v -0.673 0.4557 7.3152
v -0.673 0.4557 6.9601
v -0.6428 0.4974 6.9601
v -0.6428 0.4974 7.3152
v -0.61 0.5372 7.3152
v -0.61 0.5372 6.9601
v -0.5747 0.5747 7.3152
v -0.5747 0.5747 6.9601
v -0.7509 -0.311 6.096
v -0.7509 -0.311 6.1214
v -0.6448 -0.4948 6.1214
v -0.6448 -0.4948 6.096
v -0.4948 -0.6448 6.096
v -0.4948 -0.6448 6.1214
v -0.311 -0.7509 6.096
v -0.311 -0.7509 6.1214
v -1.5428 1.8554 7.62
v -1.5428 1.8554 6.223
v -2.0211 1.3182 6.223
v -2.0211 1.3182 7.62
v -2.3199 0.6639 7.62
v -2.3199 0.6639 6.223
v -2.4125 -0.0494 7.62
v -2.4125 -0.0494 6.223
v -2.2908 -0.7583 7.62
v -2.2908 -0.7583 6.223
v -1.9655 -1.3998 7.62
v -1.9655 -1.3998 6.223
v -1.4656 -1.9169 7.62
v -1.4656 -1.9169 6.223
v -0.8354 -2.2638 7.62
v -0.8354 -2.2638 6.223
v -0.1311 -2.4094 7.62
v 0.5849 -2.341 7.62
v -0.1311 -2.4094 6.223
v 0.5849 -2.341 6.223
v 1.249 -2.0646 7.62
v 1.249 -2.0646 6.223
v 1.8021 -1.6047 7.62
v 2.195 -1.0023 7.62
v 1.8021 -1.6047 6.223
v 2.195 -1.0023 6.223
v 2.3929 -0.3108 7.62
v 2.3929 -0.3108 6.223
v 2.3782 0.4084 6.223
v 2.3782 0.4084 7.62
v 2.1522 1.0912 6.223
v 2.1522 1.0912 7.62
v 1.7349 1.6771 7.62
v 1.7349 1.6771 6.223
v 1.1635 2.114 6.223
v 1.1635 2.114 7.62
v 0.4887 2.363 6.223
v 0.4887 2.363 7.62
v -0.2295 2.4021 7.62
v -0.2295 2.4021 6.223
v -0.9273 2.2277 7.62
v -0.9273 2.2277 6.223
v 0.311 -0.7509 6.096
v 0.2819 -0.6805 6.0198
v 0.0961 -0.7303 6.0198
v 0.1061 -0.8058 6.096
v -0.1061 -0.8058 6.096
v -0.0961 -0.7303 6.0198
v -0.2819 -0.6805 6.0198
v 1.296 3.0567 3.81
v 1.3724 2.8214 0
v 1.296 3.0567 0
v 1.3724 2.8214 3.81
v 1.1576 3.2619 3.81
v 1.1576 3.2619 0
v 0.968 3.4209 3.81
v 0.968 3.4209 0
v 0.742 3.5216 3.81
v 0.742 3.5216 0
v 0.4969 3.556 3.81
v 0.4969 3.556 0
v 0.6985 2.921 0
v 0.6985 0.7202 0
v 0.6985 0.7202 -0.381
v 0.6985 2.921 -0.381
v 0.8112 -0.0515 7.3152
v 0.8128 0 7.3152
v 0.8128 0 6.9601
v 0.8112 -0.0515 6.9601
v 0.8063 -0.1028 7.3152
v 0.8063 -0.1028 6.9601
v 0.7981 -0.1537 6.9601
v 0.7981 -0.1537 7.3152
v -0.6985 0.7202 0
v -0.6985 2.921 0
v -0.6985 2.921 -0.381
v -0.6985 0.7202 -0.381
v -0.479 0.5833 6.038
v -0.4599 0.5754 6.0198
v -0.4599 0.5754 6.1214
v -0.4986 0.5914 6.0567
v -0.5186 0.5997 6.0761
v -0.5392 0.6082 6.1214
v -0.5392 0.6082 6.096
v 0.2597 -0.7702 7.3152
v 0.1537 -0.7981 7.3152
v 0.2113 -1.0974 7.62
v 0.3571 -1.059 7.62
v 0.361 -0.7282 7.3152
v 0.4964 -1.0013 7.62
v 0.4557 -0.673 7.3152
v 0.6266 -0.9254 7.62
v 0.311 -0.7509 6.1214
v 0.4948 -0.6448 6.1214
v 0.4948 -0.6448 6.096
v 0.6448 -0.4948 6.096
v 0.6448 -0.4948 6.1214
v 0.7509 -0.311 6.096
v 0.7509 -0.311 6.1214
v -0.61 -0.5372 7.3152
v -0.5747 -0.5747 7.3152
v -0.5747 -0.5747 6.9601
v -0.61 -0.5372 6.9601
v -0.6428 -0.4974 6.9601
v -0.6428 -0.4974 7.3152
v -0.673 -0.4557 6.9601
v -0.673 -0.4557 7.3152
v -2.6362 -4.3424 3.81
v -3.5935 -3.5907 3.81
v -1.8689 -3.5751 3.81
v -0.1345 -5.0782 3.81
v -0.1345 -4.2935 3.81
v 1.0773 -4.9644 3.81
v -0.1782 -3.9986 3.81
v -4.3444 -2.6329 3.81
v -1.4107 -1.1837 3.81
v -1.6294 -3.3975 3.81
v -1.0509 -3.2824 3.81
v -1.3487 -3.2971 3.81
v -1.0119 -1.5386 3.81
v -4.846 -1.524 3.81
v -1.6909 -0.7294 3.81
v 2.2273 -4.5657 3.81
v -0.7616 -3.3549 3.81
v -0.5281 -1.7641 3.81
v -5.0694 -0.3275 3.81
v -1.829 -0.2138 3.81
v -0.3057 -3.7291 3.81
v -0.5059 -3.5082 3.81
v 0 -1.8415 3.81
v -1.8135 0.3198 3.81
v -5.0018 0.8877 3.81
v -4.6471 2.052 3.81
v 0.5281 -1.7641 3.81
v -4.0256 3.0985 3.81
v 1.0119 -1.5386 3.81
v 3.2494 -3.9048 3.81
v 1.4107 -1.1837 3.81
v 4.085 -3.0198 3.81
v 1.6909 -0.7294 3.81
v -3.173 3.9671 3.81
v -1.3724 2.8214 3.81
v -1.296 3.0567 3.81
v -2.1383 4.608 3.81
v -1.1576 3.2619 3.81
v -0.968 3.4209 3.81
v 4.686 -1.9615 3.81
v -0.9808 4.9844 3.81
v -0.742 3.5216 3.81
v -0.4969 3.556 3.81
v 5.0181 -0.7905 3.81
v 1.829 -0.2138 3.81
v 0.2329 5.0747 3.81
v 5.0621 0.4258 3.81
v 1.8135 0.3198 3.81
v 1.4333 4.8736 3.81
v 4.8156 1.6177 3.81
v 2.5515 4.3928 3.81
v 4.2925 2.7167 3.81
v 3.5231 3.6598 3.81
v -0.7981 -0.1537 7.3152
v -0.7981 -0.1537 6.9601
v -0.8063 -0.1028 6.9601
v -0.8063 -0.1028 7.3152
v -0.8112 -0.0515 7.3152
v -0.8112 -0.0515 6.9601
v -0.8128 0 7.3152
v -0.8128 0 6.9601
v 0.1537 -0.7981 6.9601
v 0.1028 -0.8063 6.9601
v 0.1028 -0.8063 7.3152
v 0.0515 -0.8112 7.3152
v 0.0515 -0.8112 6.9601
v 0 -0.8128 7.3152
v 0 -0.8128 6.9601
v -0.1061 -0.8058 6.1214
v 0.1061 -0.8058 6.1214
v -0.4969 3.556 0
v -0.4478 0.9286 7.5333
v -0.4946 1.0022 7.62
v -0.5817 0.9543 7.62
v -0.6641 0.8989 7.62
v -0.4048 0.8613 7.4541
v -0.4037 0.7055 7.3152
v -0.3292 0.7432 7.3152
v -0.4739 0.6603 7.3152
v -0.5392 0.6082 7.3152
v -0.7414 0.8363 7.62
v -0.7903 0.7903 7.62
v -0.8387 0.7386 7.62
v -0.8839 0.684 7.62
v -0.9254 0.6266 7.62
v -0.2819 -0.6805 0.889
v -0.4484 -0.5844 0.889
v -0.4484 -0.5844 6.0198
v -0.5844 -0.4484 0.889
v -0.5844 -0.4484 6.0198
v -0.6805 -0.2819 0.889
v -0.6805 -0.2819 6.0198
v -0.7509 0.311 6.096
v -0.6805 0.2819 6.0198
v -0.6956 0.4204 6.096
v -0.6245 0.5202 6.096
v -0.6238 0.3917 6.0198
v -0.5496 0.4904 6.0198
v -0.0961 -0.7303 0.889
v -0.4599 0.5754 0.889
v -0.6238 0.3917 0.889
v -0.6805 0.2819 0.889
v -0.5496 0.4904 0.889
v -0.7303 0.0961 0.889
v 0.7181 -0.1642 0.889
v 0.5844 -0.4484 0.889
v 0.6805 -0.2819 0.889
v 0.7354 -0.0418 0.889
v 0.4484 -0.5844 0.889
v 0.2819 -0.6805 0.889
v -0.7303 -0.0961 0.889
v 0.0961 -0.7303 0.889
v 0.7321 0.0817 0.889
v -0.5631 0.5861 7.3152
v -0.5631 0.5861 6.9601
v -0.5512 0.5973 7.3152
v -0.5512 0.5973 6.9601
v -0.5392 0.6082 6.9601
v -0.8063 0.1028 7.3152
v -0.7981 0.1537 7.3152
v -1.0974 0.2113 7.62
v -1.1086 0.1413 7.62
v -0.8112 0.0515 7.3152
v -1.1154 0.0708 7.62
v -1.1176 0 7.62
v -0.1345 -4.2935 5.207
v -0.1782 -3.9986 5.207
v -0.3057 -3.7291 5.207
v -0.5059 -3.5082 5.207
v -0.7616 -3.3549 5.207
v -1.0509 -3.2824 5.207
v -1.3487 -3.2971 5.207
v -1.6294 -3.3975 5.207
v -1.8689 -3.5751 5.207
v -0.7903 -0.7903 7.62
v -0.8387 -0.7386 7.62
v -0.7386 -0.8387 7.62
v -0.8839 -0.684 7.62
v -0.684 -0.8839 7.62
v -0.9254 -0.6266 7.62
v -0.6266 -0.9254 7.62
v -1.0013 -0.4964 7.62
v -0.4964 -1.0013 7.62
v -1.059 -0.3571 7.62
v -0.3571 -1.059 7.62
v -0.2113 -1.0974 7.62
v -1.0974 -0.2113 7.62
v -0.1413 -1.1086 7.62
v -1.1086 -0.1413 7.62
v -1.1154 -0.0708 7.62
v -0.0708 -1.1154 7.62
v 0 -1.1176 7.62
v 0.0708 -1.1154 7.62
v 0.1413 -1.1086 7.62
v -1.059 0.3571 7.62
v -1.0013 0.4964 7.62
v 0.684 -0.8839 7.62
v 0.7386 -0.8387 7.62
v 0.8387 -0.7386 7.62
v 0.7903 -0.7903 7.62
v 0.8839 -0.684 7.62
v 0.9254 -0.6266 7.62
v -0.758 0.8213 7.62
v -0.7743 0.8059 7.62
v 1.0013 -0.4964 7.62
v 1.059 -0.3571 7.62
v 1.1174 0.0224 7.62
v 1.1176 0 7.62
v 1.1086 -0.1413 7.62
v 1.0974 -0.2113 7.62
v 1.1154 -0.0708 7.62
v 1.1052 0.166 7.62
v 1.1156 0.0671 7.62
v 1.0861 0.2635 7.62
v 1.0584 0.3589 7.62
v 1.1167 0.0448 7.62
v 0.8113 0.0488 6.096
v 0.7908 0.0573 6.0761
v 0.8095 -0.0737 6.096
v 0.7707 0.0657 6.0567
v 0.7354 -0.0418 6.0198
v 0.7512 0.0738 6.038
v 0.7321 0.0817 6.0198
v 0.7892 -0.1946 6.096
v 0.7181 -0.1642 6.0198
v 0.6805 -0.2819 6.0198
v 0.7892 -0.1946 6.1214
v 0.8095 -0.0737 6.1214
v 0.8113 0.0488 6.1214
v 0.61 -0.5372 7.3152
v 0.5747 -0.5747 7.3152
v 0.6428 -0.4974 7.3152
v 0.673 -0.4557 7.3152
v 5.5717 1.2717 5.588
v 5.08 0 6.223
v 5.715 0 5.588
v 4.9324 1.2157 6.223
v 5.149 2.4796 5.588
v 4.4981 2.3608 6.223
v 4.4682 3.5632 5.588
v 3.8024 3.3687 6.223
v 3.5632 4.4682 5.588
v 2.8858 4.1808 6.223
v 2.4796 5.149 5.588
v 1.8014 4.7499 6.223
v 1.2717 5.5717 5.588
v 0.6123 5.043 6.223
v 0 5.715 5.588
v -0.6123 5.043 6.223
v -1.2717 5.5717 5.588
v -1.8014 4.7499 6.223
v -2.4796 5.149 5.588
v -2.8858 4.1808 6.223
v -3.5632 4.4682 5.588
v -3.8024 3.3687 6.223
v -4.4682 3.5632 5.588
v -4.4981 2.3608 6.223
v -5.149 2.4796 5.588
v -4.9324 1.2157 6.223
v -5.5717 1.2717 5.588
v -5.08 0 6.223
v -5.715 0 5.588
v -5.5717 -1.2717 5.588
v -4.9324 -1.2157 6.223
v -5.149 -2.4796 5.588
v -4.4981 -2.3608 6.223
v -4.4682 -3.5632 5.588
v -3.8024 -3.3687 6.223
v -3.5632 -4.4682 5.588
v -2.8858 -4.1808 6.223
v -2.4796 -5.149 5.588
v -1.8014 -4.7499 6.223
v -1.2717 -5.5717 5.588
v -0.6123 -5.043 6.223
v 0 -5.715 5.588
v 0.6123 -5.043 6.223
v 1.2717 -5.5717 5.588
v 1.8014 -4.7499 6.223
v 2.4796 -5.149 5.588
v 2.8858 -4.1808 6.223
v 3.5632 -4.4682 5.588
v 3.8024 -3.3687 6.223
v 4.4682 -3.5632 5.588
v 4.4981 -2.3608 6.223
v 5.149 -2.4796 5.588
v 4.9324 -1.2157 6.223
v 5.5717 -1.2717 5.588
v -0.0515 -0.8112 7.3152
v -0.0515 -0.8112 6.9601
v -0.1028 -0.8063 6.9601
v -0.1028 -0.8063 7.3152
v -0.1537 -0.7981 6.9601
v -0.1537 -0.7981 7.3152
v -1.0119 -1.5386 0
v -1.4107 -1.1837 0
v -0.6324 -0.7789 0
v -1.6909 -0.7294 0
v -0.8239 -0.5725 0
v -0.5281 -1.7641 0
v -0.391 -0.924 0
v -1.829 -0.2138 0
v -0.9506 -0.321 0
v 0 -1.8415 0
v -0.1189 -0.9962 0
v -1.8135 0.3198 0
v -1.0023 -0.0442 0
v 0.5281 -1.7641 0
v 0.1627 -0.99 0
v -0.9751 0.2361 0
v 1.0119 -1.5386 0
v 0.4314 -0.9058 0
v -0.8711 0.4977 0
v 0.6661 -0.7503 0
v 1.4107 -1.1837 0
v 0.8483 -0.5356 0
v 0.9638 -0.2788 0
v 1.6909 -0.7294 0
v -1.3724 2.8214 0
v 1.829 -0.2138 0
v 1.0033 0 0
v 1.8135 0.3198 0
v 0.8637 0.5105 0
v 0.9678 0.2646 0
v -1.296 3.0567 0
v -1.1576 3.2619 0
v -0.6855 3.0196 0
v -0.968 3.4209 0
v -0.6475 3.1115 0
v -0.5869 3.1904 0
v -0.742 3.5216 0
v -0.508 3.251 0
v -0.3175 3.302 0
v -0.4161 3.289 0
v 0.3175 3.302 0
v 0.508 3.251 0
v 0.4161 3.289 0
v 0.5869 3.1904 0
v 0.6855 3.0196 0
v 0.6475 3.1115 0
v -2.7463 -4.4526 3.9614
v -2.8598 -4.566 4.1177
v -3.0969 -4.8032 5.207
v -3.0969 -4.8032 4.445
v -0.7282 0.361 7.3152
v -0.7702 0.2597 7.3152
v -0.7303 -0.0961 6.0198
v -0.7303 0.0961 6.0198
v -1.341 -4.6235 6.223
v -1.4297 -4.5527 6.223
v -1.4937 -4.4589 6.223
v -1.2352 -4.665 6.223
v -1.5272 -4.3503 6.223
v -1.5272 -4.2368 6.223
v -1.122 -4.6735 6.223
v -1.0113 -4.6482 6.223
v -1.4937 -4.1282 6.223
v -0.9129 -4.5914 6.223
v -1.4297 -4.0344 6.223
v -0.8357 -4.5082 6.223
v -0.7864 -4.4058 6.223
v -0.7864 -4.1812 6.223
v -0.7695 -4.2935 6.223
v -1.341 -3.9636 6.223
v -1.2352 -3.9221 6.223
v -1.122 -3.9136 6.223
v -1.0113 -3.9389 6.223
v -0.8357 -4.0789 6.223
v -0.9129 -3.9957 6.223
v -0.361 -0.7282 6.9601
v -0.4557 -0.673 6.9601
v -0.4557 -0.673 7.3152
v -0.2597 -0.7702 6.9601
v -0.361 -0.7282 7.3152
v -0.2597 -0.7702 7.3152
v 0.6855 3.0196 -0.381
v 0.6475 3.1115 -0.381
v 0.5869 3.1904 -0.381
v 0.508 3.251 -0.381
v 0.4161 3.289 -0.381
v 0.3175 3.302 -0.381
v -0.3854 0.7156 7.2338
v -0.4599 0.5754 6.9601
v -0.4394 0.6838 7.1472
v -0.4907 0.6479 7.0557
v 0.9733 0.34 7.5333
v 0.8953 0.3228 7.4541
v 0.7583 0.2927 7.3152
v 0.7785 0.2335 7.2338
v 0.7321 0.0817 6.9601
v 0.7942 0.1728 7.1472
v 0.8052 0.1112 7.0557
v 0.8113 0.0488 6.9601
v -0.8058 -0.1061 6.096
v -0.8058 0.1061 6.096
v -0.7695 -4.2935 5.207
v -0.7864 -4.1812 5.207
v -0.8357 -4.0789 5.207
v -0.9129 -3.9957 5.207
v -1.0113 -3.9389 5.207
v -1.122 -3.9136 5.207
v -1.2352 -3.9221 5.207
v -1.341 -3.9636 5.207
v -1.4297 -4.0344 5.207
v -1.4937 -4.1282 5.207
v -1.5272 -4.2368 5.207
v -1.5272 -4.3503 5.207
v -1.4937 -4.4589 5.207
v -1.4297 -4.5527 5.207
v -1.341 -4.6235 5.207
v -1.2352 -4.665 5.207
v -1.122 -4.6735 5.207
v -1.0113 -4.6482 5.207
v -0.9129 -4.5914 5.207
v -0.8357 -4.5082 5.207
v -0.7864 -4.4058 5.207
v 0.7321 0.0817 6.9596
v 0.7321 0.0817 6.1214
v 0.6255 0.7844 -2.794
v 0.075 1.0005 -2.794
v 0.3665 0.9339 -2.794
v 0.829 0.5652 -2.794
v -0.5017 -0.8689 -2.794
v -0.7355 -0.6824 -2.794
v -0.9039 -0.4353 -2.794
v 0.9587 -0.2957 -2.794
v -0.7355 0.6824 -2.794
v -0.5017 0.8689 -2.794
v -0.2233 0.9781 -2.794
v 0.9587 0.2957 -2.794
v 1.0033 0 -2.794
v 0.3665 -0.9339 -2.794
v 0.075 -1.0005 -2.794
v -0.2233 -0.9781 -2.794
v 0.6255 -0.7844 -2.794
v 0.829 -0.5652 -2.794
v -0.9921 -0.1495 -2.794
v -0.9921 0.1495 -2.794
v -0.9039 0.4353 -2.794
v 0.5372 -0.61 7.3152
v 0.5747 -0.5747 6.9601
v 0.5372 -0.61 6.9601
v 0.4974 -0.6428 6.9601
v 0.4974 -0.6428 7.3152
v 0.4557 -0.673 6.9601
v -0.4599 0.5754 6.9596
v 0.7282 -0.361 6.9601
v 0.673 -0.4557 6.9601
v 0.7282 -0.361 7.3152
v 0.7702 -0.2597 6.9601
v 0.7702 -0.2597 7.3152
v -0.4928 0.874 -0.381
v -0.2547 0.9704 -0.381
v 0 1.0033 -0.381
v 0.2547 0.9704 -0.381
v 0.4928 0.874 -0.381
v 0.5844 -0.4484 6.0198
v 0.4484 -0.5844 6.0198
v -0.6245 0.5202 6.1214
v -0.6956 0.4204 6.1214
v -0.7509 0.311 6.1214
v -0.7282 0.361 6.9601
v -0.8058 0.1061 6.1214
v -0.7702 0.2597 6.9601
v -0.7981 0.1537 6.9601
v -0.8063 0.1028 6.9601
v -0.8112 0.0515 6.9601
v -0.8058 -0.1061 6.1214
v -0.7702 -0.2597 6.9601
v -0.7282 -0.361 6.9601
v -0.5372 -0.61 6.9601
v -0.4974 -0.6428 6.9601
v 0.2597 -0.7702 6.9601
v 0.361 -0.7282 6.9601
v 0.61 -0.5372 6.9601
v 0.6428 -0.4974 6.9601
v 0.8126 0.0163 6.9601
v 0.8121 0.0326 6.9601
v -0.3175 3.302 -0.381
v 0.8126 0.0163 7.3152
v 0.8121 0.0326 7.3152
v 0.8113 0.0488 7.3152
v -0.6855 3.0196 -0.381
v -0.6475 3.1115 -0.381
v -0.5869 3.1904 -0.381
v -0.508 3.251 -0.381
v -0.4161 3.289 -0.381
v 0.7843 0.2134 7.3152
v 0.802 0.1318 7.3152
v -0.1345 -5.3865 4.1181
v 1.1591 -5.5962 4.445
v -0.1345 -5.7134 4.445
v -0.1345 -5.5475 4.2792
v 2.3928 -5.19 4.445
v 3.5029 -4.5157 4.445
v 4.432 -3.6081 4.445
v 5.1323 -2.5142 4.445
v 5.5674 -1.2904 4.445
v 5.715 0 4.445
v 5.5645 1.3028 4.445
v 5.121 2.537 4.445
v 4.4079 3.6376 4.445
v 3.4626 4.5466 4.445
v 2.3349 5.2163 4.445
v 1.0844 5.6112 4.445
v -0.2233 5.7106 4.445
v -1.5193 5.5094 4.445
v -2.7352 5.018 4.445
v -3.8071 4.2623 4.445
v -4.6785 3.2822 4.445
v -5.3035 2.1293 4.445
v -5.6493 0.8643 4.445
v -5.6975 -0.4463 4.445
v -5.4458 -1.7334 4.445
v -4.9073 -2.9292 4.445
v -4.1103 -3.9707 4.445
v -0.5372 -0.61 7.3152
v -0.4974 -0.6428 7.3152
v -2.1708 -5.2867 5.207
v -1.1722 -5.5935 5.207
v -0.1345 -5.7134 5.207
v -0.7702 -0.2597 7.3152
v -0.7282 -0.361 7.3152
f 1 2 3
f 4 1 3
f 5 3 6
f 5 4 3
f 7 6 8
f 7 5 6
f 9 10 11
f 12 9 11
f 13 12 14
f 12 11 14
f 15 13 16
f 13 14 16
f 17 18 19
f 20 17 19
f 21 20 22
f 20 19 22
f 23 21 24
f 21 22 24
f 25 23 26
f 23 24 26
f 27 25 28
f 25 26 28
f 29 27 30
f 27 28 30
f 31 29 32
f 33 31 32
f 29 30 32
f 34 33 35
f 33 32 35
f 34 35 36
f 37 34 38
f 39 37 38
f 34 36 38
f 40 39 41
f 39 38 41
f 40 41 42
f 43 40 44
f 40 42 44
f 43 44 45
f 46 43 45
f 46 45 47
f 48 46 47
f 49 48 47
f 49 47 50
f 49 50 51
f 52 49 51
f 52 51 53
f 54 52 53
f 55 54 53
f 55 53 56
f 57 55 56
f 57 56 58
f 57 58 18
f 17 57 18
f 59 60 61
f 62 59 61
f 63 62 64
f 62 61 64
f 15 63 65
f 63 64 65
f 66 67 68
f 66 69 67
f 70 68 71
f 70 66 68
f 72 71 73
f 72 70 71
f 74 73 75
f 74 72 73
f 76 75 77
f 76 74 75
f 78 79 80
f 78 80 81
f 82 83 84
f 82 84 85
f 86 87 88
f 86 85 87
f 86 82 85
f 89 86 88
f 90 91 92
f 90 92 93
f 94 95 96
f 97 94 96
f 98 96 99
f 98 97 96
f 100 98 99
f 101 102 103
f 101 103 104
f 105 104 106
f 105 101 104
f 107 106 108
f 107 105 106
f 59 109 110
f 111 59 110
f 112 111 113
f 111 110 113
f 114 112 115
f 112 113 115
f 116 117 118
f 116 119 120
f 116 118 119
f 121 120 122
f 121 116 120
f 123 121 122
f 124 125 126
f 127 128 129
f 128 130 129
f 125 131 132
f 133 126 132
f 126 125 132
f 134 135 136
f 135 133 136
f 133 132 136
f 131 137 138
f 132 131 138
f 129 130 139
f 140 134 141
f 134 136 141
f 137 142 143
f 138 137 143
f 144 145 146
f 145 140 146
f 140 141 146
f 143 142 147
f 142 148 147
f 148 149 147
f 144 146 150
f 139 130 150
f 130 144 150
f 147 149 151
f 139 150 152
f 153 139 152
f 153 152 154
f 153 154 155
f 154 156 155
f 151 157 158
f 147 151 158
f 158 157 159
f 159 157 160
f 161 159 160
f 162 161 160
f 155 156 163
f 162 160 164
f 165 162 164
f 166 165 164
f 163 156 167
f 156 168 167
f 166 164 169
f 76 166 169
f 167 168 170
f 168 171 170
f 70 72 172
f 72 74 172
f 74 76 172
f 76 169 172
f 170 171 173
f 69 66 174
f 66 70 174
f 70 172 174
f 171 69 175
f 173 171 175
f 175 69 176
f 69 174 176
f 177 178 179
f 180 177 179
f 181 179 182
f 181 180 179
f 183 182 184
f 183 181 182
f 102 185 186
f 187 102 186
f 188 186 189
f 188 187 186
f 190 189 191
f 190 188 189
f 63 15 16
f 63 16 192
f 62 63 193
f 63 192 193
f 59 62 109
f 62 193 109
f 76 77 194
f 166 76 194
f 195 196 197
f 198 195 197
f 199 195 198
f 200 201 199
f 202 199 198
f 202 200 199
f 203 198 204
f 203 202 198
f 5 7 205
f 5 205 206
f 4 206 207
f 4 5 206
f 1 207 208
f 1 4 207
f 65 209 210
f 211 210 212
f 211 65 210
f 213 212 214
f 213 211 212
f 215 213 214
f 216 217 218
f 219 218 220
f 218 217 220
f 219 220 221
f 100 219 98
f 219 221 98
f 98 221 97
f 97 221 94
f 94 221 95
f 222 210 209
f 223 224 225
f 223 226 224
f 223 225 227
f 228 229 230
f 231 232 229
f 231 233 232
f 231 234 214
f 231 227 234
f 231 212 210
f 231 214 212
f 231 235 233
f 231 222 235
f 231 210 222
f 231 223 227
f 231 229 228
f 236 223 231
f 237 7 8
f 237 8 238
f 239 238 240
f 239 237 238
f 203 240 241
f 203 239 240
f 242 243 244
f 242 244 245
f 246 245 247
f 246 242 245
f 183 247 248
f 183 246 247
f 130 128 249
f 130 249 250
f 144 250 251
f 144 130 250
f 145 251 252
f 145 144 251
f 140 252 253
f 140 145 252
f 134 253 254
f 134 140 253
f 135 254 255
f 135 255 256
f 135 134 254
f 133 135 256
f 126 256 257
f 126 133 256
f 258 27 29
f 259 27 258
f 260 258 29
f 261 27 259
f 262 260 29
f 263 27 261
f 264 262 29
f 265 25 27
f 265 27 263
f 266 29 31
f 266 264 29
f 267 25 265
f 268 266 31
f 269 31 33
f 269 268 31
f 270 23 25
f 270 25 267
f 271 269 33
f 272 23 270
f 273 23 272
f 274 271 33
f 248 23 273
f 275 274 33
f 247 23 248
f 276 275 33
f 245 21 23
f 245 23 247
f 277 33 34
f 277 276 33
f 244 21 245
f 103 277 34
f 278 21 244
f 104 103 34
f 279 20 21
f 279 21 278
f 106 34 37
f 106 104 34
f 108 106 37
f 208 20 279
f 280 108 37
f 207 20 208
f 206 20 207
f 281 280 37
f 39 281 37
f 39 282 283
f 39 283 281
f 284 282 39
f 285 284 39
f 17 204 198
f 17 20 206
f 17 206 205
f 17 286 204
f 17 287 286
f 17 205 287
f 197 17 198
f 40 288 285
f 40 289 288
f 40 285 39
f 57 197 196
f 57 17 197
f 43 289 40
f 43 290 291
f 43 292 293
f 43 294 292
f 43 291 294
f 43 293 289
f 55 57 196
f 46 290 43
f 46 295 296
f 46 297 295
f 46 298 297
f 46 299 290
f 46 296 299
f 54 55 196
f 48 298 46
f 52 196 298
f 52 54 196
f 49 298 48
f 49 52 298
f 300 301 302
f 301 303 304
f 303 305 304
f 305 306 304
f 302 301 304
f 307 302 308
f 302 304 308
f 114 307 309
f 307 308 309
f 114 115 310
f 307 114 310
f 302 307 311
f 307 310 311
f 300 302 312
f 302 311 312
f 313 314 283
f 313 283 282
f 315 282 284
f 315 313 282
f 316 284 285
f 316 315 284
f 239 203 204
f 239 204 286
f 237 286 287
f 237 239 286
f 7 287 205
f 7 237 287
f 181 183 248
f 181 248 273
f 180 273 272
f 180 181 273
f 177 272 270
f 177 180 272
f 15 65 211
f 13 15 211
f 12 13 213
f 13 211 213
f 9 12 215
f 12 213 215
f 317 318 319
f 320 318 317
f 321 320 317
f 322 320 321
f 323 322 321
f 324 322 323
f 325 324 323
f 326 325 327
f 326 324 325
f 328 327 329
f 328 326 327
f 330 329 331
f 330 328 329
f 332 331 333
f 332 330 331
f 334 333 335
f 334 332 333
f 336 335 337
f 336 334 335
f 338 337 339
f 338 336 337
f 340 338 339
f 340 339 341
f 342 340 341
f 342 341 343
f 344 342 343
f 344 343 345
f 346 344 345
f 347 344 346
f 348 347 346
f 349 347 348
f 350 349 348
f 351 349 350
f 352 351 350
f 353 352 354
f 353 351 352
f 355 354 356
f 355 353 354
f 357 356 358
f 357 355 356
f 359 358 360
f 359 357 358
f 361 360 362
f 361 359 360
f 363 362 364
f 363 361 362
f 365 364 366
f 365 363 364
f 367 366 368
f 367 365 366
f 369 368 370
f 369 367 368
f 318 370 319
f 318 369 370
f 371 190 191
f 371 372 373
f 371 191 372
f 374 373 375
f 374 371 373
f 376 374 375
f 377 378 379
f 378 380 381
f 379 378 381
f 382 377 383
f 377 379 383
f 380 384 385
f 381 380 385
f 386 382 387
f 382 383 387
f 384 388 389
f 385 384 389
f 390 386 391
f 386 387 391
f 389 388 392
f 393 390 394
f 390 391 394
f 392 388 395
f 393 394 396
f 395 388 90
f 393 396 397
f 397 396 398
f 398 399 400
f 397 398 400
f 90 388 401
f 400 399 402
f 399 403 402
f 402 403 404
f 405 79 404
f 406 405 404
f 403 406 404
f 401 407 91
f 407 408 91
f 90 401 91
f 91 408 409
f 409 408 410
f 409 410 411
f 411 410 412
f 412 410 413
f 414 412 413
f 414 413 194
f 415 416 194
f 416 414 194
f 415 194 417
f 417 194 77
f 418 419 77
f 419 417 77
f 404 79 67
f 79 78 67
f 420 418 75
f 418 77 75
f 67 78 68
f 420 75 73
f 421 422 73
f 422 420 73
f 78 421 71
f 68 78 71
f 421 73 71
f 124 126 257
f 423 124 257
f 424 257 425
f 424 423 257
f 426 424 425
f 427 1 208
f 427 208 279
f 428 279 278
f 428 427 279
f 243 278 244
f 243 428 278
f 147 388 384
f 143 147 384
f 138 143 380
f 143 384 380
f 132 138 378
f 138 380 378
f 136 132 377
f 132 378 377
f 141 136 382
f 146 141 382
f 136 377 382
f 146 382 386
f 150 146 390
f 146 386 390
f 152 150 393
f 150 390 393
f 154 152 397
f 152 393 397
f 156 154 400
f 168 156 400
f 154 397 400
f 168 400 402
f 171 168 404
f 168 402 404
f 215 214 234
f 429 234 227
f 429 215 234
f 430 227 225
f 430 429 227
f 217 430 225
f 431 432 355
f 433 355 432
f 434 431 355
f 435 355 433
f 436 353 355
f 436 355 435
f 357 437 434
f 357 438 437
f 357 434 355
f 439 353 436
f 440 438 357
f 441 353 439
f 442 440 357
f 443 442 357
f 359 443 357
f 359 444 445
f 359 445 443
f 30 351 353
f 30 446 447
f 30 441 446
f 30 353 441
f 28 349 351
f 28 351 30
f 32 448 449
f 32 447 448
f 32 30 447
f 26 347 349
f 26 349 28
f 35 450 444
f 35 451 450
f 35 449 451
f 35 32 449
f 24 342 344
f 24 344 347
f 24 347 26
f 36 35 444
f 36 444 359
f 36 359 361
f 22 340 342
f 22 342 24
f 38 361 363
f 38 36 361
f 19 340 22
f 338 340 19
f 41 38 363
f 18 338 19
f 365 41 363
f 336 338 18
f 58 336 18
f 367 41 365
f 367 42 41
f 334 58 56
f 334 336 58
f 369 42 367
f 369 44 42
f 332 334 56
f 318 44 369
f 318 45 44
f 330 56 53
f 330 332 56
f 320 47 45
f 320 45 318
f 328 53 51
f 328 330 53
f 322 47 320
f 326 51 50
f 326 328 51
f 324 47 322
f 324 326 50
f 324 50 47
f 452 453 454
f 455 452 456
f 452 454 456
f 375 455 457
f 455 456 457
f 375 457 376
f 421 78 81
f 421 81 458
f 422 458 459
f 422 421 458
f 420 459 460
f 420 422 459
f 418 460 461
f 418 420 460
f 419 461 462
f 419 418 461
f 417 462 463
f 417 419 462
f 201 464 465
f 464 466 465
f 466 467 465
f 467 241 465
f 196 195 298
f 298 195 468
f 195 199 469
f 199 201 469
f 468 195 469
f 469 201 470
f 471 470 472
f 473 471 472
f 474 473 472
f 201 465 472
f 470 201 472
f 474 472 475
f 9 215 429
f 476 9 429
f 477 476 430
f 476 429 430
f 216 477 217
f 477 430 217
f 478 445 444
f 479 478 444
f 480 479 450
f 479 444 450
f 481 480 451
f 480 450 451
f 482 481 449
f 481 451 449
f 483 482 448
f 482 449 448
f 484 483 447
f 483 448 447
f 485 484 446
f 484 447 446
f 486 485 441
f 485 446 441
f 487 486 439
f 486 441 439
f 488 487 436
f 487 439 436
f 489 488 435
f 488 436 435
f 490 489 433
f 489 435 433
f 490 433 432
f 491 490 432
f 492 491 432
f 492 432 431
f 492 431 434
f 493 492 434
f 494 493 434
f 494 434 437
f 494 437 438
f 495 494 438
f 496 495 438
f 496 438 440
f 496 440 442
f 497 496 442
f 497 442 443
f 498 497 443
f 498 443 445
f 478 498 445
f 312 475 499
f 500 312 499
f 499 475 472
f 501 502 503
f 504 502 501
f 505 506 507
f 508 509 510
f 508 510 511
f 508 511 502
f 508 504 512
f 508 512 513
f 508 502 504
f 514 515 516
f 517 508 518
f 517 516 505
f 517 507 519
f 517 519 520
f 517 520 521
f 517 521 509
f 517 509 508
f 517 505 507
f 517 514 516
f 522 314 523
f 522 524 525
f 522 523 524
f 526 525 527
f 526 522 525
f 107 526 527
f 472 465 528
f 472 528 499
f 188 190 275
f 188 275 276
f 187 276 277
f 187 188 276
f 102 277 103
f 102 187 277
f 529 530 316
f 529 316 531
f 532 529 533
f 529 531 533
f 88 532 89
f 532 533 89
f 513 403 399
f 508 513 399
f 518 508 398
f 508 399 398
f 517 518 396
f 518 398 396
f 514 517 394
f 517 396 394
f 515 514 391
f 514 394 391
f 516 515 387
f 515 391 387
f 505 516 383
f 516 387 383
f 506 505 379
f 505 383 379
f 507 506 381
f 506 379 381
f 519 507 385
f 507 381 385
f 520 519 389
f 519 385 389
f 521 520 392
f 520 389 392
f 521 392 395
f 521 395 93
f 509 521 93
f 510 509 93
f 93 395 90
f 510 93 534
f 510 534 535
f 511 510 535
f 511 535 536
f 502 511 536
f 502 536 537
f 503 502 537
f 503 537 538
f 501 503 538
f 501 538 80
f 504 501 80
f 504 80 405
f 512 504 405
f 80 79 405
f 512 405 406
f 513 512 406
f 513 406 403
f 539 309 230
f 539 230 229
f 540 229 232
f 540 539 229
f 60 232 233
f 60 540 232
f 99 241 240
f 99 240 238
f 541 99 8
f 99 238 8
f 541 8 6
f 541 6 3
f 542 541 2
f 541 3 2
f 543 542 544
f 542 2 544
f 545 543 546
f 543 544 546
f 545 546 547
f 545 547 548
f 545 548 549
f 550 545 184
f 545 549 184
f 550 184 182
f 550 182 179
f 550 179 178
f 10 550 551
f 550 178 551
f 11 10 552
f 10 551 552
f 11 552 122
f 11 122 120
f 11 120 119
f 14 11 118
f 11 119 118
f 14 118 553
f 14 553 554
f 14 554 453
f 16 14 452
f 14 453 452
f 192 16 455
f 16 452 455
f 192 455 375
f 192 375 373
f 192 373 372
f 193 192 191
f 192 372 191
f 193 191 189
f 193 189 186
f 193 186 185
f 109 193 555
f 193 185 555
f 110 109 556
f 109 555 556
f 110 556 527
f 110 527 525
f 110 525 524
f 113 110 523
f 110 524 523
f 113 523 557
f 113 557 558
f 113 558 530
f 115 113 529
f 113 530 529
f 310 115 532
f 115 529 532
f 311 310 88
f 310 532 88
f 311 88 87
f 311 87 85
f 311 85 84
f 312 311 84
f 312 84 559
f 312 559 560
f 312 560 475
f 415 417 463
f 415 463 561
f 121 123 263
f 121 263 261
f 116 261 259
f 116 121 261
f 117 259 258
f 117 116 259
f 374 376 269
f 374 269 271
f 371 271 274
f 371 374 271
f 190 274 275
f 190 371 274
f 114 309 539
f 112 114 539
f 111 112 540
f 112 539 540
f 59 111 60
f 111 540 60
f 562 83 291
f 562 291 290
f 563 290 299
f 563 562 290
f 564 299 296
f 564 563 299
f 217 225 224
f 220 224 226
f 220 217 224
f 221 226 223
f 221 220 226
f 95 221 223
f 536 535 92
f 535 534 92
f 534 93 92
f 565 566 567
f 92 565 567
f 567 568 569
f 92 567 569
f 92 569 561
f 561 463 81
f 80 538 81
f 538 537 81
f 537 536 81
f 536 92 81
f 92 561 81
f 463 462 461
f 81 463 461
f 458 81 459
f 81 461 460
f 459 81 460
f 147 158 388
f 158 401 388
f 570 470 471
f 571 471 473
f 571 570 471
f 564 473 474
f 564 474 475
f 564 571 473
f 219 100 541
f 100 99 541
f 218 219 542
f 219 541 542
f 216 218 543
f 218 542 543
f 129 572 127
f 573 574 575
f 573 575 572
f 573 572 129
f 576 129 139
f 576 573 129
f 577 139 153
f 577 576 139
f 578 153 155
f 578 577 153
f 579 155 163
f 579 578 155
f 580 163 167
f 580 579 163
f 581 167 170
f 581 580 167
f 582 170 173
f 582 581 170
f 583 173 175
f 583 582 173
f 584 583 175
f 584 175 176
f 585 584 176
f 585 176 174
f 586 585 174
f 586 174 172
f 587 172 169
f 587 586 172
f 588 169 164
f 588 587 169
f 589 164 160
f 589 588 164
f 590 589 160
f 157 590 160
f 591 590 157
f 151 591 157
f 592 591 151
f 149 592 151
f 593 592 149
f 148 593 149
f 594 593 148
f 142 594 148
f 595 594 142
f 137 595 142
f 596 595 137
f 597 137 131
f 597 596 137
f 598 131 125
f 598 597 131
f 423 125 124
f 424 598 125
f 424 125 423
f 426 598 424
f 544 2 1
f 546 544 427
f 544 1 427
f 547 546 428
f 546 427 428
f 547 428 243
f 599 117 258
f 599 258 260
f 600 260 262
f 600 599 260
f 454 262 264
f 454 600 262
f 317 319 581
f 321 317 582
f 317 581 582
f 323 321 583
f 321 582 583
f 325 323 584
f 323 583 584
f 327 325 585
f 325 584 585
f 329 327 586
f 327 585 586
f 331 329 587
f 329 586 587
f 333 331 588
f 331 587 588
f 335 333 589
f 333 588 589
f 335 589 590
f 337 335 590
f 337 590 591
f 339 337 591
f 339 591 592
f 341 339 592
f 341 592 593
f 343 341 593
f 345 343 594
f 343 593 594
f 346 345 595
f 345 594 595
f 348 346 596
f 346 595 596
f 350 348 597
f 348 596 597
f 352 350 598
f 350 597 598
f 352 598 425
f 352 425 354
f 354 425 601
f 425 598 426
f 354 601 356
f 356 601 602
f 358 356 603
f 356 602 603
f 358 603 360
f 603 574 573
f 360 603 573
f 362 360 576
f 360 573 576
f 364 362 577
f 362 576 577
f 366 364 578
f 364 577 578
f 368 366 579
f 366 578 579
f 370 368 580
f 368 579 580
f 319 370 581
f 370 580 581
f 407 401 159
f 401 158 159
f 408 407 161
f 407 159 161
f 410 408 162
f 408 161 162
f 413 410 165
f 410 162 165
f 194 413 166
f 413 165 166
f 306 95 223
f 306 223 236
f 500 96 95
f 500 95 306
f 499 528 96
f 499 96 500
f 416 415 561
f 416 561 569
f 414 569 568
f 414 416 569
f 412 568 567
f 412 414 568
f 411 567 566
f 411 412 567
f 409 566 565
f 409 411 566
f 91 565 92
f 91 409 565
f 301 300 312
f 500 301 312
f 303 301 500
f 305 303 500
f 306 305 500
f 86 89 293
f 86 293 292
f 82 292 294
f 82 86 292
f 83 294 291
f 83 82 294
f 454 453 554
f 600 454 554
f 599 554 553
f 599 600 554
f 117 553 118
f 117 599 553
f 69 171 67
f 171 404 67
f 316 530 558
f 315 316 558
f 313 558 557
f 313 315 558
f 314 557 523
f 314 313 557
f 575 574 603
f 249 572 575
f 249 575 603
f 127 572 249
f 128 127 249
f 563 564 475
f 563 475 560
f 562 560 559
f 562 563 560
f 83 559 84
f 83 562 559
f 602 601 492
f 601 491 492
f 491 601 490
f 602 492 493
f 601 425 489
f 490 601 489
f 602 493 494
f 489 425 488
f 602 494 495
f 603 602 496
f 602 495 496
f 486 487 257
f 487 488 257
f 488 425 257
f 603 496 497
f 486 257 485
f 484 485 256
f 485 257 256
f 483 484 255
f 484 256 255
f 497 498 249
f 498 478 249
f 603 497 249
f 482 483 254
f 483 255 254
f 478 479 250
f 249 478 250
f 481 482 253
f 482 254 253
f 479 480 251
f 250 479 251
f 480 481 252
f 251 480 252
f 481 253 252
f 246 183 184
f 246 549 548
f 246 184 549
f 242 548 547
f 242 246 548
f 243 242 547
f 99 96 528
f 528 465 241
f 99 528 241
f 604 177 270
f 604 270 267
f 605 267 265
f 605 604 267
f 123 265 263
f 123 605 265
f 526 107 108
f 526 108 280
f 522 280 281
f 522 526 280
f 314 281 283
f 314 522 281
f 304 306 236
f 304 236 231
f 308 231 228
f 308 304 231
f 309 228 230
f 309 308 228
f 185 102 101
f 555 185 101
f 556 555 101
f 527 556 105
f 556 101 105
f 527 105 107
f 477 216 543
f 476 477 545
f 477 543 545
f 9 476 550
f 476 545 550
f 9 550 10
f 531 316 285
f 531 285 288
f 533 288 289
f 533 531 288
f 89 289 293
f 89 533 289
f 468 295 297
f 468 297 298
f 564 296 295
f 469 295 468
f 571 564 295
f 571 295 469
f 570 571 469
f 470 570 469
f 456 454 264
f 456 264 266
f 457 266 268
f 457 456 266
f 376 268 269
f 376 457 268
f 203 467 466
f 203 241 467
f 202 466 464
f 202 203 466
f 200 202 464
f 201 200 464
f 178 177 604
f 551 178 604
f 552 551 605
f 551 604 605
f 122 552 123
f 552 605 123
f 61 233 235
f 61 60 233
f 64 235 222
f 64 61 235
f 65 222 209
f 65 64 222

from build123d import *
from build123d.topology import SkipClean

# Parameters (mm, degrees)
EXTRUDE1_DEPTH               = 3.81
SKETCH8_R                    = 2.413
EXTRUDE8_DEPTH               = 3.81
SKETCH6_R                    = 5.715
EXTRUDE6_DEPTH               = 2.413
SKETCH4_R                    = 0.254
EXTRUDE4_DEPTH               = 6.731
SKETCH5_R                    = 1.0033
EXTRUDE5_DEPTH               = 2.794
FILLET2_R                    = 0.889
CHAMFER1_SIZE                = 0.635
SKETCH7_R                    = 0.381
EXTRUDE7_DEPTH               = 13.109035428
CHAMFER3_SIZE                = 0.635
EXTRUDE9_DEPTH               = 0.381
EXTRUDE10_DEPTH              = 1.397
EXTRUDE11_DEPTH              = 6.731
CIRPATTERN1_COUNT            = 8
EXTRUDE12_DEPTH              = 6.731
CHAMFER4_SIZE                = 0.381
CHAMFER4_SIZE2               = 0.659911358
EXTRUDE13_DEPTH              = 0.6604
CUT_REVOLVE1_ANGLE           = 130
CUT_REVOLVE1_OTHER_WAY_ANGLE = 90
BOSS_EXTRUDE1_DEPTH          = 6.071088642
CUT_EXTRUDE1_DEPTH           = 0.838688642
CHAMFER5_SIZE                = 0.1016
CHAMFER6_SIZE                = 0.3048


with BuildPart() as part:
    # Sketch1 → Extrude1 (new body)
    with BuildSketch(Plane.XY):
        with BuildLine():
            Line((-1.242889362, 3.556), (-1.813523477, 0.319773119))
            ThreePointArc((-1.813523477, 0.319773119), (0, -1.8415), (1.813523477, 0.319773119))
            Line((1.813523477, 0.319773119), (1.242889362, 3.556))
            Line((1.242889362, 3.556), (-1.242889362, 3.556))
        make_face()
    extrude(amount=EXTRUDE1_DEPTH)

    # Sketch8 → Extrude8 (add)
    with BuildSketch(Plane.XY.offset(3.81)):
        with Locations(Location((0, 0, 0), (0, 0, 129.743387424))):
            Circle(SKETCH8_R)
    extrude(amount=EXTRUDE8_DEPTH)

    # Sketch6 → Extrude6 (add)
    with BuildSketch(Plane.XY.offset(3.81)):
        Circle(SKETCH6_R)
    extrude(amount=EXTRUDE6_DEPTH)

    # Sketch4 → Extrude4 (cut)
    with BuildSketch(Plane.XY.offset(7.62)):
        Circle(SKETCH4_R)
    extrude(amount=-EXTRUDE4_DEPTH, mode=Mode.SUBTRACT)

    # Sketch5 → Extrude5 (add)
    with BuildSketch(Plane(origin=(0, 0, 0), x_dir=(-1, 0, 0), z_dir=(0, 0, -1))):
        with Locations(Location((0, 0, 0), (0, 0, 180))):
            Circle(SKETCH5_R)
    extrude(amount=EXTRUDE5_DEPTH)

    # Fillet2
    fillet2_edges = [part.edges().sort_by_distance(p)[0] for p in [
        (1.242889362, 3.556, 1.905),
        (-1.242889362, 3.556, 1.905),
    ]]
    fillet(fillet2_edges, radius=FILLET2_R)

    # Chamfer1
    chamfer1_edges = [part.edges().sort_by_distance(p)[0] for p in [
        (-5.715, 0, 3.81),
    ]]
    chamfer(chamfer1_edges, length=CHAMFER1_SIZE)

    # Sketch7 → Extrude7 (cut, through all)
    with BuildSketch(Plane.XY.offset(6.223)):
        with Locations((-1.150450655, -4.293540298)):
            Circle(SKETCH7_R)
    extrude(amount=-EXTRUDE7_DEPTH, mode=Mode.SUBTRACT)

    # Chamfer3
    chamfer3_edges = [part.edges().sort_by_distance(p)[0] for p in [
        (-5.715, 0, 6.223),
    ]]
    chamfer(chamfer3_edges, length=CHAMFER3_SIZE)

    # Sketch9 → Extrude9 (add)
    with BuildSketch(Plane(origin=(0, 0, 0), x_dir=(-1, 0, 0), z_dir=(0, 0, -1))):
        with BuildLine():
            Line((-0.3175, 3.302), (0.3175, 3.302))
            ThreePointArc((0.3175, 3.302), (0.586907684, 3.190407684), (0.6985, 2.921))
            Line((0.6985, 2.921), (0.6985, 0))
            Line((0.6985, 0), (-0.6985, 0))
            Line((-0.6985, 0), (-0.6985, 2.921))
            ThreePointArc((-0.6985, 2.921), (-0.586907684, 3.190407684), (-0.3175, 3.302))
        make_face()
    extrude(amount=EXTRUDE9_DEPTH)

    # Sketch11 → Extrude10 (cut)
    with BuildSketch(Plane(origin=(0, 0, 3.81), x_dir=(-1, 0, 0), z_dir=(0, 0, -1))):
        with BuildLine():
            Line((1.868871145, -3.575119808), (3.096912551, -4.803161214))
            Line((3.096912551, -4.803161214), (3.096912551, -5.713418243))
            Line((3.096912551, -5.713418243), (0.134450655, -5.713418243))
            Line((0.134450655, -5.713418243), (0.134450655, -4.293540298))
            ThreePointArc((0.134450655, -4.293540298), (0.761644288, -3.354878693), (1.868871145, -3.575119808))
        make_face()
    extrude(amount=-EXTRUDE10_DEPTH, mode=Mode.SUBTRACT)

    # Sketch17 → Extrude11 (cut)
    with BuildSketch(Plane.XY.offset(7.62)):
        with BuildLine():
            Line((0, 0), (0, 0.8128))
            ThreePointArc((0, 0.8128), (0.077181384, 0.80912723), (0.153665255, 0.798142111))
            ThreePointArc((0.153665255, 0.798142111), (0.281884616, 0.680529664), (0.455713955, 0.673029443))
            ThreePointArc((0.455713955, 0.673029443), (0.517563871, 0.626714831), (0.574736392, 0.574736392))
            Line((0.574736392, 0.574736392), (0, 0))
        make_face()
    extrude11 = extrude(amount=-EXTRUDE11_DEPTH, mode=Mode.SUBTRACT)

    # CirPattern1: Extrude11 ×8 about axis
    cirpattern1_axis = Axis((0, 0, 0), (0, 0, 1))
    for i in range(1, CIRPATTERN1_COUNT):
        add(extrude11.rotate(cirpattern1_axis, i * 360 / CIRPATTERN1_COUNT), mode=Mode.SUBTRACT)

    # Sketch18 → Extrude12 (add)
    with BuildSketch(Plane.XY.offset(7.62)):
        Polygon((-0.539167209, 0.608229037), (0.811331666, 0.048834087), (0.986294531, 0.471231809), (-0.364204343, 1.030626759), align=None)
    extrude(amount=-EXTRUDE12_DEPTH)

    # Chamfer4
    chamfer4_edges = [part.edges().sort_by_distance(p)[0] for p in [
        (0.136082229, 0.328531562, 7.62),
    ]]
    chamfer4_side = [part.faces().sort_by_distance(p)[0] for p in [
        (1.499116567, -1.802914954, 7.62),
    ]]
    chamfer(chamfer4_edges, length=CHAMFER4_SIZE, length2=CHAMFER4_SIZE2, reference=chamfer4_side[0])

    # Sketch19 → Extrude13 (cut)
    with SkipClean():  # the faces are left unmerged after this step: merging them gives an invalid solid
        with BuildSketch(Plane.XY.offset(7.62)):
            with BuildLine():
                Line((0.811331666, 0.048834087), (-0.539167209, 0.608229037))
                ThreePointArc((-0.539167209, 0.608229037), (-0.311045094, -0.750929284), (0.811331666, 0.048834087))
            make_face()
        extrude(amount=-EXTRUDE13_DEPTH, mode=Mode.SUBTRACT)

    # Sketch20 → Cut-Revolve1 (revolve, cut)
    with SkipClean():  # the faces are left unmerged after this step: merging them gives an invalid solid
        with BuildSketch(Plane(origin=(0, 0, 0), x_dir=(0, 0, -1), z_dir=(1, 0, 0))):
            Polygon((-6.9596, -0.8128), (-6.9596, 0), (-6.1468, 0), align=None)
        revolve(axis=Axis((0, 0, 7.389643883), (0, 0, -1)), revolution_arc=CUT_REVOLVE1_ANGLE, mode=Mode.SUBTRACT)

    # Sketch20 → Cut-Revolve1 other way (revolve, cut)
    with SkipClean():  # the faces are left unmerged after this step: merging them gives an invalid solid
        with BuildSketch(Plane(origin=(0, 0, 0), x_dir=(0, 0, -1), z_dir=(1, 0, 0))):
            Polygon((-6.9596, -0.8128), (-6.9596, 0), (-6.1468, 0), align=None)
        revolve(axis=Axis((0, 0, 7.389643883), (0, 0, 1)), revolution_arc=CUT_REVOLVE1_OTHER_WAY_ANGLE, mode=Mode.SUBTRACT)

    # Sketch21 → Boss-Extrude1 (add)
    with SkipClean():  # the faces are left unmerged after this step: merging them gives an invalid solid
        with BuildSketch(Plane.XY.offset(6.960088642)):
            with BuildLine():
                Line((-0.459893976, 0.575392988), (-0.539167209, 0.608229037))
                ThreePointArc((-0.539167209, 0.608229037), (-0.311045094, -0.750929284), (0.811331666, 0.048834087))
                Line((0.811331666, 0.048834087), (0.732058433, 0.081670135))
                ThreePointArc((0.732058433, 0.081670135), (-0.281884616, -0.680529664), (-0.459893976, 0.575392988))
            make_face()
        extrude(amount=-BOSS_EXTRUDE1_DEPTH)

    # Sketch22 → Cut-Extrude1 (cut)
    with SkipClean():  # the faces are left unmerged after this step: merging them gives an invalid solid
        with BuildSketch(Plane.XY.offset(6.960088642)):
            with BuildLine():
                Line((-0.459893976, 0.575392988), (-0.539167209, 0.608229037))
                ThreePointArc((-0.539167209, 0.608229037), (-0.311045094, -0.750929284), (0.811331666, 0.048834087))
                Line((0.811331666, 0.048834087), (0.732058433, 0.081670135))
                ThreePointArc((0.732058433, 0.081670135), (-0.281884616, -0.680529664), (-0.459893976, 0.575392988))
            make_face()
        extrude(amount=-CUT_EXTRUDE1_DEPTH, mode=Mode.SUBTRACT)

    # Chamfer5
    # the kernel refuses this chamfer: 0.1016 mm, written as the material it takes off along each edge
    with BuildSketch(Plane(origin=(0, 0, 6.1214), x_dir=(-0.3826834323650876, -0.9238795325112875, 0), z_dir=(0.9238795325112875, -0.3826834323650876, 0))) as chamfer5_piece_1_section:
        Polygon((0.7366 + CHAMFER5_SIZE, 0), (0.7366, CHAMFER5_SIZE), (0.7366, 0), align=None)
    chamfer5_piece_1 = revolve(axis=Axis((0, 0, 6.1214), (0, 0, -1)), revolution_arc=45, mode=Mode.PRIVATE)
    chamfer5_piece_1 = chamfer5_piece_1 & Plane(origin=(0, 0, 6.085965336), x_dir=(-0.6633454831704748, 0.74831328329606, 0), z_dir=(0, 0, 1)) * Cylinder(0.8128, 4, mode=Mode.PRIVATE)
    add(chamfer5_piece_1, mode=Mode.SUBTRACT)
    with BuildSketch(Plane(origin=(0, 0, 6.1214), x_dir=(0.3826834323650712, -0.9238795325112945, 0), z_dir=(0.9238795325112945, 0.3826834323650712, 0))) as chamfer5_piece_2_section:
        Polygon((0.7366 + CHAMFER5_SIZE, 0), (0.7366, CHAMFER5_SIZE), (0.7366, 0), align=None)
    chamfer5_piece_2 = revolve(axis=Axis((0, 0, 6.1214), (0, 0, -1)), revolution_arc=45, mode=Mode.PRIVATE)
    chamfer5_piece_2 = chamfer5_piece_2 & Plane(origin=(0, 0, 6.085965336), x_dir=(-0.6633454831704748, 0.74831328329606, 0), z_dir=(0, 0, 1)) * Cylinder(0.8128, 4, mode=Mode.PRIVATE)
    add(chamfer5_piece_2, mode=Mode.SUBTRACT)
    with BuildSketch(Plane(origin=(0, 0, 6.1214), x_dir=(-0.9238795325112938, -0.3826834323650728, 0), z_dir=(0.3826834323650728, -0.9238795325112938, 0))) as chamfer5_piece_3_section:
        Polygon((0.7366 + CHAMFER5_SIZE, 0), (0.7366, CHAMFER5_SIZE), (0.7366, 0), align=None)
    chamfer5_piece_3 = revolve(axis=Axis((0, 0, 6.1214), (0, 0, -1)), revolution_arc=45, mode=Mode.PRIVATE)
    chamfer5_piece_3 = chamfer5_piece_3 & Plane(origin=(0, 0, 6.085965336), x_dir=(-0.6633454831704748, 0.74831328329606, 0), z_dir=(0, 0, 1)) * Cylinder(0.8128, 4, mode=Mode.PRIVATE)
    add(chamfer5_piece_3, mode=Mode.SUBTRACT)
    with BuildSketch(Plane(origin=(0, 0, 6.1214), x_dir=(-0.9238795325112764, 0.3826834323651145, 0), z_dir=(-0.3826834323651145, -0.9238795325112764, 0))) as chamfer5_piece_4_section:
        Polygon((0.7366 + CHAMFER5_SIZE, 0), (0.7366, CHAMFER5_SIZE), (0.7366, 0), align=None)
    chamfer5_piece_4 = revolve(axis=Axis((0, 0, 6.1214), (0, 0, -1)), revolution_arc=49.190233443, mode=Mode.PRIVATE)
    chamfer5_piece_4 = chamfer5_piece_4 & Plane(origin=(0, 0, 6.085613455), x_dir=(-0.6633454831704748, 0.74831328329606, 0), z_dir=(0, 0, 1)) * Cylinder(0.8128, 4, mode=Mode.PRIVATE)
    chamfer5_piece_4 = split(chamfer5_piece_4, bisect_by=Plane(origin=(-0.544175649, 0.610303601, 6.085613455), z_dir=(-0.38268343236508656, -0.9238795325112882, 0)), keep=Keep.TOP, mode=Mode.PRIVATE)
    add(chamfer5_piece_4, mode=Mode.SUBTRACT)
    with BuildSketch(Plane(origin=(0, 0, 6.1214), x_dir=(0.9238795325112772, -0.3826834323651127, 0), z_dir=(0.3826834323651127, 0.9238795325112772, 0))) as chamfer5_piece_5_section:
        Polygon((0.7366 + CHAMFER5_SIZE, 0), (0.7366, CHAMFER5_SIZE), (0.7366, 0), align=None)
    chamfer5_piece_5 = revolve(axis=Axis((0, 0, 6.1214), (0, 0, -1)), revolution_arc=45, mode=Mode.PRIVATE)
    chamfer5_piece_5 = chamfer5_piece_5 & Plane(origin=(0, 0, 6.085965336), x_dir=(-0.6633454831704748, 0.74831328329606, 0), z_dir=(0, 0, 1)) * Cylinder(0.8128, 4, mode=Mode.PRIVATE)
    add(chamfer5_piece_5, mode=Mode.SUBTRACT)
    with BuildSketch(Plane(origin=(0, 0, 6.1214), x_dir=(0.8934479656215565, 0.44916670928142266, 0), z_dir=(-0.44916670928142266, 0.8934479656215565, 0))) as chamfer5_piece_6_section:
        Polygon((0.7366 + CHAMFER5_SIZE, 0), (0.7366, CHAMFER5_SIZE), (0.7366, 0), align=None)
    chamfer5_piece_6 = revolve(axis=Axis((0, 0, 6.1214), (0, 0, -1)), revolution_arc=49.190233443, mode=Mode.PRIVATE)
    chamfer5_piece_6 = chamfer5_piece_6 & Plane(origin=(0, 0, 6.085613455), x_dir=(-0.6633454831704748, 0.74831328329606, 0), z_dir=(0, 0, 1)) * Cylinder(0.8128, 4, mode=Mode.PRIVATE)
    chamfer5_piece_6 = split(chamfer5_piece_6, bisect_by=Plane(origin=(0.816340106, 0.046759523, 6.085613455), z_dir=(-0.38268343236508556, -0.9238795325112885, 0)), keep=Keep.TOP, mode=Mode.PRIVATE)
    add(chamfer5_piece_6, mode=Mode.SUBTRACT)

    # Chamfer6
    chamfer6_edges = [part.edges().sort_by_distance(p)[0] for p in [
        (-0.311045094, -0.750929284, 7.62),
    ]]
    chamfer(chamfer6_edges, length=CHAMFER6_SIZE)


solid = part.part
